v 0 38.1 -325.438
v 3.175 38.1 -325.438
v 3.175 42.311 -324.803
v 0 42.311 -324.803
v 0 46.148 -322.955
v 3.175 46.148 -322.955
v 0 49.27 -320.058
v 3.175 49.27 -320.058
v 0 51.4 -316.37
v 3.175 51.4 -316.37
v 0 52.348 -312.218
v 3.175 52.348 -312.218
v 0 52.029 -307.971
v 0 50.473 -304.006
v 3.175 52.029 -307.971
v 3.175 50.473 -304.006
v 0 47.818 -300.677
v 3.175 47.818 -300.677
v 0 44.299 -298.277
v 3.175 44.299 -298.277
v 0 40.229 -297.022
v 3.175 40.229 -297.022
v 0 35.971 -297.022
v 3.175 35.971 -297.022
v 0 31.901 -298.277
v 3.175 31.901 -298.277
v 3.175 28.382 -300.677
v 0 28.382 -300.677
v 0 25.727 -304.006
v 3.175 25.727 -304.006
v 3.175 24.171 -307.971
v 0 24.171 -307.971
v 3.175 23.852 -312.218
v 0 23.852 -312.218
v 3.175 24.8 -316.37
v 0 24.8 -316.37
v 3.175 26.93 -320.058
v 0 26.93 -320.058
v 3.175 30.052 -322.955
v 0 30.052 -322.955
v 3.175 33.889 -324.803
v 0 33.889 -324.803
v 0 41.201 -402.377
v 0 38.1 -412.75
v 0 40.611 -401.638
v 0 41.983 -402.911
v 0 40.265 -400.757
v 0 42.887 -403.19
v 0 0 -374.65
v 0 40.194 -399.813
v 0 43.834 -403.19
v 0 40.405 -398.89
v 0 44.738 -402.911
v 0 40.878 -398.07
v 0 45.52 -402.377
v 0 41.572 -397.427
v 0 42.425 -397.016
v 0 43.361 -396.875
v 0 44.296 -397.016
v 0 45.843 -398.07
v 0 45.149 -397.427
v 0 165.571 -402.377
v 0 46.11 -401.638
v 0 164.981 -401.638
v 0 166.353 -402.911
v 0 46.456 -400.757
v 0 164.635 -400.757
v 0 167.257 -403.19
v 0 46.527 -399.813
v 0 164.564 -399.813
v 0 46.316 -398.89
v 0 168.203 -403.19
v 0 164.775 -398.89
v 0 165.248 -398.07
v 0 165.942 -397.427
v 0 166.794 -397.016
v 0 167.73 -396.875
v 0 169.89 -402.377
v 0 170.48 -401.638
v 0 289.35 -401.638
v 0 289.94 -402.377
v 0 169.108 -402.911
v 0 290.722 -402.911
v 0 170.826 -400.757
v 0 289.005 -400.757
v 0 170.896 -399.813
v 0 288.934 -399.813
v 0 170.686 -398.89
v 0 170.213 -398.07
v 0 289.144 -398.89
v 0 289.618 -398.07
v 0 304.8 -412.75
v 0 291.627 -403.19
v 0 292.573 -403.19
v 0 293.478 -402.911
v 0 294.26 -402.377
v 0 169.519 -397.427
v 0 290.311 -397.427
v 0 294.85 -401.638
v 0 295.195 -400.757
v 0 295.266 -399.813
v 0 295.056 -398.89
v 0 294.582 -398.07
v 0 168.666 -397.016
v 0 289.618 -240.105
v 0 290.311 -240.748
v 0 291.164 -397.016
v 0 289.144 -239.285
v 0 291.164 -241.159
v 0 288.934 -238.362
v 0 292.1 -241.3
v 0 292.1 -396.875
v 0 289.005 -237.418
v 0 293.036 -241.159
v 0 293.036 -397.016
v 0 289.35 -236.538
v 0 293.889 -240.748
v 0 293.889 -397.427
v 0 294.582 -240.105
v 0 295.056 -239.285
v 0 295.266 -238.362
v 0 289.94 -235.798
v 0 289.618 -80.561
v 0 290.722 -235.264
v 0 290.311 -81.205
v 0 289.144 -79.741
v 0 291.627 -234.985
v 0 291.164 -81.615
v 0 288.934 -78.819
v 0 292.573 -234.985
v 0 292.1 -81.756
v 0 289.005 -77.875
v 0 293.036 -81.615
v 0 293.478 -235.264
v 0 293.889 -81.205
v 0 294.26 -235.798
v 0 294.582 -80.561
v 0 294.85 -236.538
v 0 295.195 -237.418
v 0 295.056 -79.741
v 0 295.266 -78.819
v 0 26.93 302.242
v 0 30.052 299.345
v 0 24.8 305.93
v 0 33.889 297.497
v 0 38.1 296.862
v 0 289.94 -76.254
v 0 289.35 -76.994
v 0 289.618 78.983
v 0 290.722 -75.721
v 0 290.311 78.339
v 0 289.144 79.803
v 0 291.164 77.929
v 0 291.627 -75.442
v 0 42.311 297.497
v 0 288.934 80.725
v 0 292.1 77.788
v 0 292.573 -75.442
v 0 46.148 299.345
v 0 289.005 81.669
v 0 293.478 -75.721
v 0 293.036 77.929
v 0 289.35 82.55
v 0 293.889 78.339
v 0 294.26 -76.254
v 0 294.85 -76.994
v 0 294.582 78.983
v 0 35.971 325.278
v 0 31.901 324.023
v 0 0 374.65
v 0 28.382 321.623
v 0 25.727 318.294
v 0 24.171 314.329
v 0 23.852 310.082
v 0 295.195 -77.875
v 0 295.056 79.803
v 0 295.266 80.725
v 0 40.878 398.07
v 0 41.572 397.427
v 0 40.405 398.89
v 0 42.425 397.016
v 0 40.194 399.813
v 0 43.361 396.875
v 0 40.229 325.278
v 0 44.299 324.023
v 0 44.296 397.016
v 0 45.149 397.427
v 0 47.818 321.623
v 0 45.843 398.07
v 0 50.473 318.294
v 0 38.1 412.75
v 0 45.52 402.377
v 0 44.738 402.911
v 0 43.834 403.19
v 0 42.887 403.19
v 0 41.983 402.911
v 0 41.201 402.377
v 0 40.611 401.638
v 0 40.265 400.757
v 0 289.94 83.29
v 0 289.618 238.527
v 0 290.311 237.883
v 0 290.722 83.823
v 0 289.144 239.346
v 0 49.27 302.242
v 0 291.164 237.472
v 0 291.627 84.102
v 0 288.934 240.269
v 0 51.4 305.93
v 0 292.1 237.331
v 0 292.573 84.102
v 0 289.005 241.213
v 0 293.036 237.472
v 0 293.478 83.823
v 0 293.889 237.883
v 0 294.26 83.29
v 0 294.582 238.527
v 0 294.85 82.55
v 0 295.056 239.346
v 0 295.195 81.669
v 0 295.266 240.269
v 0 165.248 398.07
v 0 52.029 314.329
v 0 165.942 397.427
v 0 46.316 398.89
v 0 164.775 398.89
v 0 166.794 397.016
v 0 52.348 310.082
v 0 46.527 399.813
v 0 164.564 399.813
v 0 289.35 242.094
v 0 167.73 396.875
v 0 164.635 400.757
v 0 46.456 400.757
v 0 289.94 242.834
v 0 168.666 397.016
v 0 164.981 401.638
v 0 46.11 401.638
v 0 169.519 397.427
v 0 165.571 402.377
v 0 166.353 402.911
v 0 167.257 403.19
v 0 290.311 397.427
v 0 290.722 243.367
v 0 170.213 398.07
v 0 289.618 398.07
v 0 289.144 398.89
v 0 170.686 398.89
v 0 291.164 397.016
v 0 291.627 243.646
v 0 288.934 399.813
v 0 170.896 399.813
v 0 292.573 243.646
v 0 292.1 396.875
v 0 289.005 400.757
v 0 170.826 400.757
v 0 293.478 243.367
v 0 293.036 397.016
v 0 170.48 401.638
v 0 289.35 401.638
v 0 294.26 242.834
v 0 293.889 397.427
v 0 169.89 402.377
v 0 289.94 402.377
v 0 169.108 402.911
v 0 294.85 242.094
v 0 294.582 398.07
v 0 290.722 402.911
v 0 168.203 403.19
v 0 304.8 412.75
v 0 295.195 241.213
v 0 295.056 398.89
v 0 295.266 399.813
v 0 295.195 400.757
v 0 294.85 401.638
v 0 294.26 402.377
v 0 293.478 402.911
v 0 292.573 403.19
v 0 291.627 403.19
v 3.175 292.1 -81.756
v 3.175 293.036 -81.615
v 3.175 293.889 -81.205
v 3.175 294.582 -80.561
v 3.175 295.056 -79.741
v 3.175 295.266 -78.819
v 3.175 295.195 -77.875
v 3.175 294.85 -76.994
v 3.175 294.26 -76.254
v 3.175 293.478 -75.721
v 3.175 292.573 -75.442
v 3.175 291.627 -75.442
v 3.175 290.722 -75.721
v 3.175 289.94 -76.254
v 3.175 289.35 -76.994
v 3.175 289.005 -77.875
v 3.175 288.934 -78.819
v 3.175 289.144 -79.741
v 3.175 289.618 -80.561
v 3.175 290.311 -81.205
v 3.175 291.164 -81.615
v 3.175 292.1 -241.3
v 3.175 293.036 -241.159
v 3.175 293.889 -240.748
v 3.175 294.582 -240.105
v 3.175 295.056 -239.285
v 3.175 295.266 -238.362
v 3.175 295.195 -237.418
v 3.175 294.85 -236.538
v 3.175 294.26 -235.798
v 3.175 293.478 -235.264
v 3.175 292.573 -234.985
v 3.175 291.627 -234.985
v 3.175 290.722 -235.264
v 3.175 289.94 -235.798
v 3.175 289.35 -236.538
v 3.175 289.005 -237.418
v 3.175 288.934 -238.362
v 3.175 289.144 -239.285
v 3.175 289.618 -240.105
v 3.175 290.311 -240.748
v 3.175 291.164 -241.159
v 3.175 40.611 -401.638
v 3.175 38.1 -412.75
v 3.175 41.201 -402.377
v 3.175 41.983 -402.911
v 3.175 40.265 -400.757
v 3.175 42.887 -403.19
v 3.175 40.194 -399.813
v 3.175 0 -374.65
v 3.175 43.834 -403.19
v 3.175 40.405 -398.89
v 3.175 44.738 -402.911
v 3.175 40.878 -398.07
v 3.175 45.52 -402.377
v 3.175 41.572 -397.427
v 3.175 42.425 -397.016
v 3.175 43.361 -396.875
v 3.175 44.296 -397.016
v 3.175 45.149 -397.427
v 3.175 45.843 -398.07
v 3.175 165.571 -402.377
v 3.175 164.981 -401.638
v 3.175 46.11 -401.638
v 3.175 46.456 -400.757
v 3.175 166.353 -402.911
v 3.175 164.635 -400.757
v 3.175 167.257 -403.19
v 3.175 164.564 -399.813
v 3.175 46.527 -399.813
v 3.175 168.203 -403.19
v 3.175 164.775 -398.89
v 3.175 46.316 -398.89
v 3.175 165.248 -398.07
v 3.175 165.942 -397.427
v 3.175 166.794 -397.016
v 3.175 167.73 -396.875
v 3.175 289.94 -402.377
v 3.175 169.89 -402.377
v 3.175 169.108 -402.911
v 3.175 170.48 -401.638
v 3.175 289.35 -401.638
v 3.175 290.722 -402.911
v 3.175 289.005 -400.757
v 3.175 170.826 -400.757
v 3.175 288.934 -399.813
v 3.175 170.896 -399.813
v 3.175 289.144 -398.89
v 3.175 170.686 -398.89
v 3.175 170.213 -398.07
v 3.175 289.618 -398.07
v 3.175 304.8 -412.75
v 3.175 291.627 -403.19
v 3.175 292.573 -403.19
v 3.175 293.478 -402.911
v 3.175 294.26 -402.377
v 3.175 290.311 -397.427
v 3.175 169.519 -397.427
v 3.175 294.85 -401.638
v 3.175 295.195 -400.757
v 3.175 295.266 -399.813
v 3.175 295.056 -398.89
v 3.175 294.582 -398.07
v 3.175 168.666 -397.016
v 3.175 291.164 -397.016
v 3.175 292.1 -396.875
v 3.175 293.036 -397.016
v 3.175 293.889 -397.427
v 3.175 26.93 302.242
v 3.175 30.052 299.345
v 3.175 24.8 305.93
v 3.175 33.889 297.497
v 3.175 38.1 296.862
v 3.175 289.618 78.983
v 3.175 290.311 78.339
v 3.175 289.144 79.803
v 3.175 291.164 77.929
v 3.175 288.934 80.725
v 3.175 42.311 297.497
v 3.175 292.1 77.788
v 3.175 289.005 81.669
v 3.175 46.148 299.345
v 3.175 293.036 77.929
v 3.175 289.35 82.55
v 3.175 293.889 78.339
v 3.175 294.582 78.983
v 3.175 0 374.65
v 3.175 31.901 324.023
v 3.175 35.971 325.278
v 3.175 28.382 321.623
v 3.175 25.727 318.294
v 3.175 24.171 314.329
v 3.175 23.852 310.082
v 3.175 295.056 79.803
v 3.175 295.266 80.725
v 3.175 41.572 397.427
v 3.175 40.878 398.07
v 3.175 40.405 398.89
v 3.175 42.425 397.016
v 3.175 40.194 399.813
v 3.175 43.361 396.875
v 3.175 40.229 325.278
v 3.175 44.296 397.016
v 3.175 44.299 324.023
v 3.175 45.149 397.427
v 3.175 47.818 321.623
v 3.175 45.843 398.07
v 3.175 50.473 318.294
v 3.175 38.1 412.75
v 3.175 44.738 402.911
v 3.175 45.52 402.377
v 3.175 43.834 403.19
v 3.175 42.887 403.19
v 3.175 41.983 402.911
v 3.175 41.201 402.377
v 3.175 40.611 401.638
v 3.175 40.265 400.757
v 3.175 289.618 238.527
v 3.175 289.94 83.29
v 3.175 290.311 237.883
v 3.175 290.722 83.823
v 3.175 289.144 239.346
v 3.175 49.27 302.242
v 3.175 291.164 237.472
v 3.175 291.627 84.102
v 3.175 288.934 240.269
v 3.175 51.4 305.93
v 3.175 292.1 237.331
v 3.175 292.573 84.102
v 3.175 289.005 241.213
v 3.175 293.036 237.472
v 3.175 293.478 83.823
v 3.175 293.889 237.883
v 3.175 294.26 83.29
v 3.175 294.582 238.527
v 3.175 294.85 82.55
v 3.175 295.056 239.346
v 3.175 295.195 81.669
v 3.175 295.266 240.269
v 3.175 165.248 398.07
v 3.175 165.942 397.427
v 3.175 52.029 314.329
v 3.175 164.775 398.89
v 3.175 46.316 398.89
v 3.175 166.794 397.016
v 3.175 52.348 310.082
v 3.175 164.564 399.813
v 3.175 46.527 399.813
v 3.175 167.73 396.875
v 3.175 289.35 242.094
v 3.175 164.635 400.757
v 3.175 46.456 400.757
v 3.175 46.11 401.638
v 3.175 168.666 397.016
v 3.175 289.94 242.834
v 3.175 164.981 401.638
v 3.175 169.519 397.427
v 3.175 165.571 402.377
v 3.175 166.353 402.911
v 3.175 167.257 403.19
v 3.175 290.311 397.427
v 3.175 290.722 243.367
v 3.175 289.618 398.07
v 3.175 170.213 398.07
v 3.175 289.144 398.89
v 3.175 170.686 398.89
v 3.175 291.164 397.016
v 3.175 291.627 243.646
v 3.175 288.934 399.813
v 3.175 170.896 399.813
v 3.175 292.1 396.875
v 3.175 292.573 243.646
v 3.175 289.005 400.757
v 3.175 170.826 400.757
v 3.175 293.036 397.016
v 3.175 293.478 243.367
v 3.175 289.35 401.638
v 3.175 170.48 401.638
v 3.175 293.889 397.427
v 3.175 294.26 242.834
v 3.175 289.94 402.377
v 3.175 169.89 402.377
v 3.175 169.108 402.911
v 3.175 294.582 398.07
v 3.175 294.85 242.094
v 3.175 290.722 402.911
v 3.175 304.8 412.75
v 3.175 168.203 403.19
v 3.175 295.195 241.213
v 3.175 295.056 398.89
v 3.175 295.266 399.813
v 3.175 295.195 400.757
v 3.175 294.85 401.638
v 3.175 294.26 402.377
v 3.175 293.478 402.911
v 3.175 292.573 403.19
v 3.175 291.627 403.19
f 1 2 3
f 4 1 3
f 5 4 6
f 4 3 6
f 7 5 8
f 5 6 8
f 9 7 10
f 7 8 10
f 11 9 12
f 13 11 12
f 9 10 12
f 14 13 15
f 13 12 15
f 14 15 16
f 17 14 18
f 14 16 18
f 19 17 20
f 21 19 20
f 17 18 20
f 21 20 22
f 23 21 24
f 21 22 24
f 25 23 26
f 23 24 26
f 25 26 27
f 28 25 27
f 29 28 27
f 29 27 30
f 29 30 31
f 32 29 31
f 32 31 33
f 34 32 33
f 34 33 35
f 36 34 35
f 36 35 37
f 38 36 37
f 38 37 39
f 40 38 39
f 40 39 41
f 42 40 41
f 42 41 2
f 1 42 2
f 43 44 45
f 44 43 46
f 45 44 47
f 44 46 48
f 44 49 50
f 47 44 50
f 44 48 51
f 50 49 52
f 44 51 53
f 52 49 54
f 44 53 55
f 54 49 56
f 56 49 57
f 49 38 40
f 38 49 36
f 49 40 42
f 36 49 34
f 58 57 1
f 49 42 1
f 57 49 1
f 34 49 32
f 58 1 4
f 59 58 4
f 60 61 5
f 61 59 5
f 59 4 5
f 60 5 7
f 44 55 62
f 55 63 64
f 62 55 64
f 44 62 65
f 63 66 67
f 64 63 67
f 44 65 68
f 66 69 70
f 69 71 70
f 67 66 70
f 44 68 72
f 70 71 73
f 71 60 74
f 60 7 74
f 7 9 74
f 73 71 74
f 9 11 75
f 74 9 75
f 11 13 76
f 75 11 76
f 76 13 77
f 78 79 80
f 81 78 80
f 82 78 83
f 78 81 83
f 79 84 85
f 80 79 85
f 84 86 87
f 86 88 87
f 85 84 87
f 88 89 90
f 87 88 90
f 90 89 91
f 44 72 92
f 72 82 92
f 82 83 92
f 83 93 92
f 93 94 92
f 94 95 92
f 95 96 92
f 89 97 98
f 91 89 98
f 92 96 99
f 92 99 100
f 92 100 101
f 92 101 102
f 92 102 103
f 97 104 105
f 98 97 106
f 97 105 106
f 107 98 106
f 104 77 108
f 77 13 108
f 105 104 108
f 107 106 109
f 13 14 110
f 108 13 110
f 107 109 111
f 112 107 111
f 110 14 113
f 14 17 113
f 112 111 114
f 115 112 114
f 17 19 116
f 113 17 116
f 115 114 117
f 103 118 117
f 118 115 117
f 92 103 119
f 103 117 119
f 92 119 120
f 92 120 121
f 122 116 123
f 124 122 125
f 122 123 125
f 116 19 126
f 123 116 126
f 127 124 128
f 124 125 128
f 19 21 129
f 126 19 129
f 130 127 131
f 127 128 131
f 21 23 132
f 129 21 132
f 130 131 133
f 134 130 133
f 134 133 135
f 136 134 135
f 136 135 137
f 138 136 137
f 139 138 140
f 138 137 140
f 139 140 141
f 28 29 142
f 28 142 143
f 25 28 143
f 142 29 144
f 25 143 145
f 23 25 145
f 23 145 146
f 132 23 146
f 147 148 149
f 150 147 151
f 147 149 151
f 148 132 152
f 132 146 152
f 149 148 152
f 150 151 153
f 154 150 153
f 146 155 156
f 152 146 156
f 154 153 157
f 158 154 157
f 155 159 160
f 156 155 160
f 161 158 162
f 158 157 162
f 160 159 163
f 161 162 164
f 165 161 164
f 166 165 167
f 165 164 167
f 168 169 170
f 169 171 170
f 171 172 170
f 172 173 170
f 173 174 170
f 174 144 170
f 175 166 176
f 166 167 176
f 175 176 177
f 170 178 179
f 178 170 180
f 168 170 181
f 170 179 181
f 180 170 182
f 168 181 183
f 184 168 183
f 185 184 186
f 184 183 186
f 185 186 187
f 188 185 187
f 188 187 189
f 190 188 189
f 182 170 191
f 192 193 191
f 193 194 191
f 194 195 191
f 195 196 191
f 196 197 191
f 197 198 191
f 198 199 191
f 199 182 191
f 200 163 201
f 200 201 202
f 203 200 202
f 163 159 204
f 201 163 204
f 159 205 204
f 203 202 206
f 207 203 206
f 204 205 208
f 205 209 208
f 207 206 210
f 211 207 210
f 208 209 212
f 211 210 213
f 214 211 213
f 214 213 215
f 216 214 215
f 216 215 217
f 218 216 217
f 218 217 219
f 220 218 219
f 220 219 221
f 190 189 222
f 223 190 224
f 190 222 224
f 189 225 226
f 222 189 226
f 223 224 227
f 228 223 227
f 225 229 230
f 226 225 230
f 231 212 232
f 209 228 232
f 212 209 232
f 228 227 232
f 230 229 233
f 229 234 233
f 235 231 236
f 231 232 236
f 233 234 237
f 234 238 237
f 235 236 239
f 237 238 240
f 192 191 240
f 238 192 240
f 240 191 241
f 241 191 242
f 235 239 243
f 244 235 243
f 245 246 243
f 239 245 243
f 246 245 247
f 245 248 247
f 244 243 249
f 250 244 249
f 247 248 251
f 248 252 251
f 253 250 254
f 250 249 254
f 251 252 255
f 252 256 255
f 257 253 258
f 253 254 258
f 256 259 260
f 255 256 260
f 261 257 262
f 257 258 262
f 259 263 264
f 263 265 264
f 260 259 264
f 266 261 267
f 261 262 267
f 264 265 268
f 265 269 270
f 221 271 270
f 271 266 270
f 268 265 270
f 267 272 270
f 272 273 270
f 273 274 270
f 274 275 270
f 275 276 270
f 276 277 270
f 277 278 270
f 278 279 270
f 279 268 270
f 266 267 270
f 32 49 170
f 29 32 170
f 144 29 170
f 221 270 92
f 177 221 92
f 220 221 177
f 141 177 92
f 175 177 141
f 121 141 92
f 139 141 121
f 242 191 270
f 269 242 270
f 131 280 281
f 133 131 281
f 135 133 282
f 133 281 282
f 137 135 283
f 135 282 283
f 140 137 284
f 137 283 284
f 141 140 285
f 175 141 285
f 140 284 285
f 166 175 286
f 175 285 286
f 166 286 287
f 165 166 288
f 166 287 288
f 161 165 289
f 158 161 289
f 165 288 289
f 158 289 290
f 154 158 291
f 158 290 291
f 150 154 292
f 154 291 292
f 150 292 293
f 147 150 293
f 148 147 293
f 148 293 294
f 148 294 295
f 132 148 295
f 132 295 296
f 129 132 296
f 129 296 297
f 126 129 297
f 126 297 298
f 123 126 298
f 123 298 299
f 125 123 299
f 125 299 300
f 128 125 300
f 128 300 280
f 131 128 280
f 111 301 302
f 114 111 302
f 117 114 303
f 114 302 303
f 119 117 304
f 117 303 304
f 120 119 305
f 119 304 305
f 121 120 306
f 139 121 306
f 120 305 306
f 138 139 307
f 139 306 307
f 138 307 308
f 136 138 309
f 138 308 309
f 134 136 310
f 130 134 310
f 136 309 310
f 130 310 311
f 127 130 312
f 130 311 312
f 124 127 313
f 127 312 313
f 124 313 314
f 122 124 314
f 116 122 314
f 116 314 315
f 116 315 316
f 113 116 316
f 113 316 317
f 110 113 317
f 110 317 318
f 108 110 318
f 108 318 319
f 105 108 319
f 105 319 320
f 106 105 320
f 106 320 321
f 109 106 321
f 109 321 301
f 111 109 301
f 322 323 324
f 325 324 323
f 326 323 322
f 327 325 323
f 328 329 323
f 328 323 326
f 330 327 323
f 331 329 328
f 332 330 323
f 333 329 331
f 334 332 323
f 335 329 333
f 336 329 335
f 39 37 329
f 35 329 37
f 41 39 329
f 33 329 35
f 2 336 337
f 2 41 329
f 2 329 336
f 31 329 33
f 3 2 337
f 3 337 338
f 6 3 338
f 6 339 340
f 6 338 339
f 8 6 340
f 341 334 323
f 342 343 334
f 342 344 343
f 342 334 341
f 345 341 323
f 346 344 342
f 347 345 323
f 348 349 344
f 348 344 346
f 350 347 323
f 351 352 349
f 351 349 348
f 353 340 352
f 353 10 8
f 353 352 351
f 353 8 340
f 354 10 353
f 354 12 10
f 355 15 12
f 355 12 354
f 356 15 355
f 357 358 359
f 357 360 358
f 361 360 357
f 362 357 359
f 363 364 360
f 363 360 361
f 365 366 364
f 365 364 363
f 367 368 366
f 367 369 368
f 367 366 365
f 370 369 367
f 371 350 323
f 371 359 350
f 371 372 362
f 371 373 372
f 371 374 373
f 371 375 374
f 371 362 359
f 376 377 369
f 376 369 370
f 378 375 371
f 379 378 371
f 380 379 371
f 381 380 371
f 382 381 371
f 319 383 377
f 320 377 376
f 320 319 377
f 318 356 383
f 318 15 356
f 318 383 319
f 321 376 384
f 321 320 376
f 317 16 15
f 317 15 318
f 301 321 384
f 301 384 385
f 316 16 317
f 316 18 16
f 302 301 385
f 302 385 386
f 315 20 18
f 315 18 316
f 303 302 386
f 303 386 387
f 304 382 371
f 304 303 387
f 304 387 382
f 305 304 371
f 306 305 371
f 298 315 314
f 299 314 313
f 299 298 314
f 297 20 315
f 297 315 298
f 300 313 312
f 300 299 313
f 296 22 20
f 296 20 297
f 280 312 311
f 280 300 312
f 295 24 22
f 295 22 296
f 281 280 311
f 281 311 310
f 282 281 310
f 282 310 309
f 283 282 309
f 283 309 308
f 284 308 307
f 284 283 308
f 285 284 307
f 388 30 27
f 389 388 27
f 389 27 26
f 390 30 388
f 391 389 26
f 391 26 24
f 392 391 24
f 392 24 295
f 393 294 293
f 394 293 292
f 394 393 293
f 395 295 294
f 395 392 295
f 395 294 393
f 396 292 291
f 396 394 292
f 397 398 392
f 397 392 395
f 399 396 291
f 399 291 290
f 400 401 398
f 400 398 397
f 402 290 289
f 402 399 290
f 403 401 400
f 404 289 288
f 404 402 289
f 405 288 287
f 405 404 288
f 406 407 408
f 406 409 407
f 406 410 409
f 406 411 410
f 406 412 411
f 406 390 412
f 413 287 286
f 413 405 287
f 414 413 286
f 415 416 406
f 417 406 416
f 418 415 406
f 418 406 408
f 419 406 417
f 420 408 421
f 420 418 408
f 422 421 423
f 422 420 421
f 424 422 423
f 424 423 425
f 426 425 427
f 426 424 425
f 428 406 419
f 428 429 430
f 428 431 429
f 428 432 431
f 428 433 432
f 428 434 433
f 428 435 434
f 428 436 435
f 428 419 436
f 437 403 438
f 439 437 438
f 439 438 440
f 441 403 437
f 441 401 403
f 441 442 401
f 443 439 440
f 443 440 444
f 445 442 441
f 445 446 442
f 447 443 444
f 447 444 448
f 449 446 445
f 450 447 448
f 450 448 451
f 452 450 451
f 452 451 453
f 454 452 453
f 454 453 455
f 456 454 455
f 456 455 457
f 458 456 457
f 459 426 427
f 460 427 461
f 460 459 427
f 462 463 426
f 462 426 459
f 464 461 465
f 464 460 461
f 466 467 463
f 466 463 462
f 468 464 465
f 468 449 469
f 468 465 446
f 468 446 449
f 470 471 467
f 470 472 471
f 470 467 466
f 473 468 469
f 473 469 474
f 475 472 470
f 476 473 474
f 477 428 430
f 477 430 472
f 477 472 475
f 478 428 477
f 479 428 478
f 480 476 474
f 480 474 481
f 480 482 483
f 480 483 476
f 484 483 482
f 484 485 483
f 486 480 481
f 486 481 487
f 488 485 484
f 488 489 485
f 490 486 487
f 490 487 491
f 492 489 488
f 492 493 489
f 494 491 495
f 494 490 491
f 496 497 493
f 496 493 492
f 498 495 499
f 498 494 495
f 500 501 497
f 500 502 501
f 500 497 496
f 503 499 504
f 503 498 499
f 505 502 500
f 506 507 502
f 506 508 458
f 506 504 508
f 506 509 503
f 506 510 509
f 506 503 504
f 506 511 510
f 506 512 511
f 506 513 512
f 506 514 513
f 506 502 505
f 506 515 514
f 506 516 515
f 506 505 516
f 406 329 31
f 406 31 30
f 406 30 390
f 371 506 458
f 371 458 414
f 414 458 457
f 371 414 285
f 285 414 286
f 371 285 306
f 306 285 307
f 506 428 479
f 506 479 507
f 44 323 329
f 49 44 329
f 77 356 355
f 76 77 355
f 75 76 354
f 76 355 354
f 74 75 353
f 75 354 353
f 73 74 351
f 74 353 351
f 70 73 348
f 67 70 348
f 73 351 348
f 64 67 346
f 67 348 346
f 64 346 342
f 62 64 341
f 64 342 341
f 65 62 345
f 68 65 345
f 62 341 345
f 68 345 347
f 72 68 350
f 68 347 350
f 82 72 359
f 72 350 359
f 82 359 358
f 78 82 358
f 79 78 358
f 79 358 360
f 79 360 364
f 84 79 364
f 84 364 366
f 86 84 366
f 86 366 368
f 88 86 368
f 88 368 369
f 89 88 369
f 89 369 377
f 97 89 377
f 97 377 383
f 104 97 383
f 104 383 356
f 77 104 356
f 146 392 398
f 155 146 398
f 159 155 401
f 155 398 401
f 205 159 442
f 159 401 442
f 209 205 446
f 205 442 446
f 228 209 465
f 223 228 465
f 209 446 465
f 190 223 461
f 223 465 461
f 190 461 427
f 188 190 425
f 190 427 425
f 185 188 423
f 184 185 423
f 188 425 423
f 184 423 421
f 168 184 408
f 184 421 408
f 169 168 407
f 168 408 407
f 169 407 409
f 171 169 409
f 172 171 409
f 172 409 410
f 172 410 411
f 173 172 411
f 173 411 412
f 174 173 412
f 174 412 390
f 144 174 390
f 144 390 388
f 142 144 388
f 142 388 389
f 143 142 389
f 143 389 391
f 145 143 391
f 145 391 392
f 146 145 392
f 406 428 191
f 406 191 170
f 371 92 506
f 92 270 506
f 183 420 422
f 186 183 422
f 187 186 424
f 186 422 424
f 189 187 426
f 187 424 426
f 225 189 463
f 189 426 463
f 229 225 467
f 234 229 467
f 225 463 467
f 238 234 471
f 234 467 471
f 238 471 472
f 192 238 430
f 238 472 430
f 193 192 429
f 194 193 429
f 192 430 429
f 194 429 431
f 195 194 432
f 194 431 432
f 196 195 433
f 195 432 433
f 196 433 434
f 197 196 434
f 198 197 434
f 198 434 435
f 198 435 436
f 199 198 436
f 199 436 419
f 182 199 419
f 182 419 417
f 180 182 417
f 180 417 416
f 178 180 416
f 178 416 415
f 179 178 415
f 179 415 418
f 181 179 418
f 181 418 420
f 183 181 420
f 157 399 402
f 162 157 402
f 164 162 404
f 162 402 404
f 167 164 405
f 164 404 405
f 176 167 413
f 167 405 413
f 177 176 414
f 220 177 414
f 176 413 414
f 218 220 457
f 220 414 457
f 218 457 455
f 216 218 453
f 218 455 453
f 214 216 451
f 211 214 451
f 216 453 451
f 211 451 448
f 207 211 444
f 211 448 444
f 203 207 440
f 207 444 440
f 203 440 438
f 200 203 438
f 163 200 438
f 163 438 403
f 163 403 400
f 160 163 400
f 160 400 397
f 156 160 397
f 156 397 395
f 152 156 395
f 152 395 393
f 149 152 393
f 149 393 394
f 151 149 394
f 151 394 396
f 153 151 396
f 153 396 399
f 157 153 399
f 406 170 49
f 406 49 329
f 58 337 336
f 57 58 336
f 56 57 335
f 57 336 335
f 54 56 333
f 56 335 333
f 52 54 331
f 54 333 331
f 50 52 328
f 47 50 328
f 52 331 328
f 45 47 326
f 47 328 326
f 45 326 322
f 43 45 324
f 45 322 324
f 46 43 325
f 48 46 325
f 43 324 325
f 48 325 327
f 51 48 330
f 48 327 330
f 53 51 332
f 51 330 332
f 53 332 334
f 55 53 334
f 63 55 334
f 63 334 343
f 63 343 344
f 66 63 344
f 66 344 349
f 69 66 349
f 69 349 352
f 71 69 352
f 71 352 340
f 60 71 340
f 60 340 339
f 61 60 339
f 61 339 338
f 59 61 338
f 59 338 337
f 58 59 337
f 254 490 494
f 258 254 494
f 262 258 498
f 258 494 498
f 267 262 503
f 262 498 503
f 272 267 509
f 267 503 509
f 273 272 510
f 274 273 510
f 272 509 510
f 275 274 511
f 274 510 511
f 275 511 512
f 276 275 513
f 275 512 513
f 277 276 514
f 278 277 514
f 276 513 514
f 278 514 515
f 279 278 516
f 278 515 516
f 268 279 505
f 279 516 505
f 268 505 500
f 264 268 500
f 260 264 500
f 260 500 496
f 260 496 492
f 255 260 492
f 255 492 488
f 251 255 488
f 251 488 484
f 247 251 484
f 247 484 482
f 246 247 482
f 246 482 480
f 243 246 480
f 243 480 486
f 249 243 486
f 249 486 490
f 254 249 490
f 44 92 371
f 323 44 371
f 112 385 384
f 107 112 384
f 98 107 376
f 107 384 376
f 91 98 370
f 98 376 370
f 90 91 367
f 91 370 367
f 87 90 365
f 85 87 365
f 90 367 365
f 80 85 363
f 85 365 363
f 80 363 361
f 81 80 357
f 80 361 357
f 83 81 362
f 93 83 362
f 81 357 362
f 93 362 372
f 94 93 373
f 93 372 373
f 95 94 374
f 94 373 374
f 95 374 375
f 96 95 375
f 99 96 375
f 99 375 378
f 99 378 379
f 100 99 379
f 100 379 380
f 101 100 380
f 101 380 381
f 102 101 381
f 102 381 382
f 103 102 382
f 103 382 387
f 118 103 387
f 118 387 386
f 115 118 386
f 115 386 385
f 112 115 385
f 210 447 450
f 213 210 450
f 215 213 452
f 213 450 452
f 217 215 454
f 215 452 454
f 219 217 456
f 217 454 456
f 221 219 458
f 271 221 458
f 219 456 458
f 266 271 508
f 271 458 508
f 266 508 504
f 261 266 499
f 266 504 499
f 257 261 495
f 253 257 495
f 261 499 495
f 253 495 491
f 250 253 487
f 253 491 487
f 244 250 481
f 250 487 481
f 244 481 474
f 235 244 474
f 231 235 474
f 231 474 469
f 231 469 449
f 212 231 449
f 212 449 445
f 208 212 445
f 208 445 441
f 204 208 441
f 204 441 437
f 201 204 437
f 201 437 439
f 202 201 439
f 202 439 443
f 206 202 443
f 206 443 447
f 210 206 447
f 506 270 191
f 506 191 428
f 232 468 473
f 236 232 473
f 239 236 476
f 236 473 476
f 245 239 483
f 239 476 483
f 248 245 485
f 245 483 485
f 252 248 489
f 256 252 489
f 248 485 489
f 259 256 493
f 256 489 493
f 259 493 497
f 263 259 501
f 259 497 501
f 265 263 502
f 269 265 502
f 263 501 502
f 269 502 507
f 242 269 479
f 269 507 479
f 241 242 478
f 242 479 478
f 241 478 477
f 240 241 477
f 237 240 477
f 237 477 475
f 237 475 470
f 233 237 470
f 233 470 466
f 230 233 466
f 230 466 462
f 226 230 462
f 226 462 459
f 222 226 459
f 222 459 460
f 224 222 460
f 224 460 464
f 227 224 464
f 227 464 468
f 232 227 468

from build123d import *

# Parameters (mm, degrees)
SKETCH1_W          = 3.175
SKETCH1_H          = 304.8
BASE_FLANGE1_DEPTH = 412.75
SKETCH6_R          = 14.2875
SKETCH6_R_2        = 3.175
CUT_EXTRUDE1_DEPTH = 514.103969118


# Sheet-metal steps are written as plain solids
with BuildPart() as part:
    # Sketch1 → Base-Flange1 (new, symmetric)
    with BuildSketch(Plane.XY):
        with Locations((1.5875, 152.4)):
            Rectangle(SKETCH1_W, SKETCH1_H)
    extrude(amount=BASE_FLANGE1_DEPTH, both=True)

    # Sketch6 → Cut-Extrude1 (cut, through all)
    with BuildSketch(Plane(origin=(3.175, 0, 0), x_dir=(0, 0, -1), z_dir=(1, 0, 0))):
        with Locations((-311.15, 38.1)):
            Circle(SKETCH6_R)
        with Locations((311.15, 38.1)):
            Circle(SKETCH6_R)
        with Locations((-400.05, 292.1)):
            Circle(SKETCH6_R_2)
        with Locations((-400.05, 167.730256121)):
            Circle(SKETCH6_R_2)
        with Locations((-400.05, 43.360512242)):
            Circle(SKETCH6_R_2)
        with Locations(Location((400.05, 43.360512242, 0), (0, 0, 180))):
            Circle(SKETCH6_R_2)
        with Locations(Location((400.05, 292.1, 0), (0, 0, 180))):
            Circle(SKETCH6_R_2)
        with Locations(Location((400.05, 167.730256121, 0), (0, 0, 180))):
            Circle(SKETCH6_R_2)
        with Locations((-240.50625, 292.1)):
            Circle(SKETCH6_R_2)
        with Locations((-80.9625, 292.1)):
            Circle(SKETCH6_R_2)
        with Locations((78.58125, 292.1)):
            Circle(SKETCH6_R_2)
        with Locations((238.125, 292.1)):
            Circle(SKETCH6_R_2)
        Polygon((-412.75, 38.1), (-374.65, 0), (-412.75, 0), align=None)
        Polygon((412.75, 0), (412.75, 38.1), (374.65, 0), align=None)
    extrude(amount=-CUT_EXTRUDE1_DEPTH, mode=Mode.SUBTRACT)


solid = part.part
